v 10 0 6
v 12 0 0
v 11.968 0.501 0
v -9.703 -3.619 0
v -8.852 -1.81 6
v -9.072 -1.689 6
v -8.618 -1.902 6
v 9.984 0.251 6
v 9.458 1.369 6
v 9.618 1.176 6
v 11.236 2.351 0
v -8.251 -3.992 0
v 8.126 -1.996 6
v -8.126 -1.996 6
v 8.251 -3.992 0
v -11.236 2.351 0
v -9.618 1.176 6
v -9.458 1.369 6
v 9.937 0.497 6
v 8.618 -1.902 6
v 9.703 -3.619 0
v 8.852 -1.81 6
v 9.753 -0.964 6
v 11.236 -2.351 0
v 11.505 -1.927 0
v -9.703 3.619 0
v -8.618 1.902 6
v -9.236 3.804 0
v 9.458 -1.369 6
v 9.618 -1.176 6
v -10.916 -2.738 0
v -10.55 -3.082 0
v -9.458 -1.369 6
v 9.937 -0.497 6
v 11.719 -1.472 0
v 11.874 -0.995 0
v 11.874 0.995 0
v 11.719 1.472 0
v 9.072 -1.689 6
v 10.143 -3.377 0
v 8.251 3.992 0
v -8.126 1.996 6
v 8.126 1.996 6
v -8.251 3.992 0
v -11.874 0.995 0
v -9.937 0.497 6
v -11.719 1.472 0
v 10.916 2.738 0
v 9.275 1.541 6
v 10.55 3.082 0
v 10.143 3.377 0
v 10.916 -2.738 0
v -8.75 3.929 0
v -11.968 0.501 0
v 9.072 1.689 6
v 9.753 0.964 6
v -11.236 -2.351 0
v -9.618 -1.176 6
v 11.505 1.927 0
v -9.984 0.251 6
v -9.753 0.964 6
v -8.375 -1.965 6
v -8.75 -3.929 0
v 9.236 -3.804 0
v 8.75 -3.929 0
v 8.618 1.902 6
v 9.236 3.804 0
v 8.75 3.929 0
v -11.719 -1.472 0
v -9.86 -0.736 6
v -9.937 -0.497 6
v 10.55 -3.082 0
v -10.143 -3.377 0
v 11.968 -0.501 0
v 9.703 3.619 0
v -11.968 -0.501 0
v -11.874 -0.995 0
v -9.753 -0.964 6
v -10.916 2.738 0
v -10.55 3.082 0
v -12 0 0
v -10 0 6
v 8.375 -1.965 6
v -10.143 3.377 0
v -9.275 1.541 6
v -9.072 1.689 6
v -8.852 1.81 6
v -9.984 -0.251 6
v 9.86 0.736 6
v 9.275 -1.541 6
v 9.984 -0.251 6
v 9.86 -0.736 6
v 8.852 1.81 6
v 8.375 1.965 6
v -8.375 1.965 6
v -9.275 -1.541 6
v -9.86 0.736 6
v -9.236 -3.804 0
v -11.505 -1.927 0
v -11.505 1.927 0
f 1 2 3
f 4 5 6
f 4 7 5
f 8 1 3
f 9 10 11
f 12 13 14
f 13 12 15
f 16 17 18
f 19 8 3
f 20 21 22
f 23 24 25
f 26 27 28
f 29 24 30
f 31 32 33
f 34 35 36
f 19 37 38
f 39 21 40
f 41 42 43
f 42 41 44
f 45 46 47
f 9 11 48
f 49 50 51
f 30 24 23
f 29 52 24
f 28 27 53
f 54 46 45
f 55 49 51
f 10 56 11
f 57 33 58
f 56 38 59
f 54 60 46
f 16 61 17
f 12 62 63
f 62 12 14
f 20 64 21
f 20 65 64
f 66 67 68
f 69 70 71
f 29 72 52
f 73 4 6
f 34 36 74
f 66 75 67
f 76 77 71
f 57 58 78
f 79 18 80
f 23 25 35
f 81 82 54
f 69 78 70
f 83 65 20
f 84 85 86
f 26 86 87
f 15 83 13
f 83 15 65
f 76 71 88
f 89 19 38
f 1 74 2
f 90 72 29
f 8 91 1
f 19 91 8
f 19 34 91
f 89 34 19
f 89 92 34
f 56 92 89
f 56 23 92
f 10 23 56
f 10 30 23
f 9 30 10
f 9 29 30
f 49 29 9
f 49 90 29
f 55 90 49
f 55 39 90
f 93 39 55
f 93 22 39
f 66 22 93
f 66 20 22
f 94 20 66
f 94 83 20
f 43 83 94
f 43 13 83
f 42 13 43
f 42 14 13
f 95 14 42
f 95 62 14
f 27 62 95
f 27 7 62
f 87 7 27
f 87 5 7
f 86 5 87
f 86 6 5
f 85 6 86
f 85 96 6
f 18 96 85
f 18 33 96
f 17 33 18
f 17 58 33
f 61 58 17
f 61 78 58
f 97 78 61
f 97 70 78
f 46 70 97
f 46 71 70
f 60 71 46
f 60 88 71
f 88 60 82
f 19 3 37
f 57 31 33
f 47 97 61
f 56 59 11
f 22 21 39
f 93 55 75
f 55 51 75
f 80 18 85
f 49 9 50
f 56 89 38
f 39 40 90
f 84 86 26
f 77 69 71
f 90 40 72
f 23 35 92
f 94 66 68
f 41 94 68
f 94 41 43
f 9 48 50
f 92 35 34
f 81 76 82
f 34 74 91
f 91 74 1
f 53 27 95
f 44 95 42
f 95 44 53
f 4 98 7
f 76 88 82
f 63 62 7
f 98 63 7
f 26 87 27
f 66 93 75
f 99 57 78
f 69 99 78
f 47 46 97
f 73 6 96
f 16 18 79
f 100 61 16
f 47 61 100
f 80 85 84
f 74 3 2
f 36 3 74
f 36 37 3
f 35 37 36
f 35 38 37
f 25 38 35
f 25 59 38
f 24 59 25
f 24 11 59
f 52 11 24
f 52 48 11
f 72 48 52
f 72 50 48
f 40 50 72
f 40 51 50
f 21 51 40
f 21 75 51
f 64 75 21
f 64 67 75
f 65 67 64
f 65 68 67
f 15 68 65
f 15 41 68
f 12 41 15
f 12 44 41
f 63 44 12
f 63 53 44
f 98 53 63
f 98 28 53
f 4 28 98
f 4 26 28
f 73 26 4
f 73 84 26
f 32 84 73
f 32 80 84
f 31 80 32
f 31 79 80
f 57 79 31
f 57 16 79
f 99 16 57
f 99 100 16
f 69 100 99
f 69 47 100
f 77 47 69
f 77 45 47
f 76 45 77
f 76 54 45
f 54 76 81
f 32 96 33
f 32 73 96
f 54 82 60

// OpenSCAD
$fn = 50;

difference() {
	union() {
		hull() {
			translate(v = [8.0, 0, 0]) {
				cylinder(h = 6, r1 = 4, r2 = 2);
			}
			translate(v = [-8.0, 0, 0]) {
				cylinder(h = 6, r1 = 4, r2 = 2);
			}
		}
	}
	union();
}
